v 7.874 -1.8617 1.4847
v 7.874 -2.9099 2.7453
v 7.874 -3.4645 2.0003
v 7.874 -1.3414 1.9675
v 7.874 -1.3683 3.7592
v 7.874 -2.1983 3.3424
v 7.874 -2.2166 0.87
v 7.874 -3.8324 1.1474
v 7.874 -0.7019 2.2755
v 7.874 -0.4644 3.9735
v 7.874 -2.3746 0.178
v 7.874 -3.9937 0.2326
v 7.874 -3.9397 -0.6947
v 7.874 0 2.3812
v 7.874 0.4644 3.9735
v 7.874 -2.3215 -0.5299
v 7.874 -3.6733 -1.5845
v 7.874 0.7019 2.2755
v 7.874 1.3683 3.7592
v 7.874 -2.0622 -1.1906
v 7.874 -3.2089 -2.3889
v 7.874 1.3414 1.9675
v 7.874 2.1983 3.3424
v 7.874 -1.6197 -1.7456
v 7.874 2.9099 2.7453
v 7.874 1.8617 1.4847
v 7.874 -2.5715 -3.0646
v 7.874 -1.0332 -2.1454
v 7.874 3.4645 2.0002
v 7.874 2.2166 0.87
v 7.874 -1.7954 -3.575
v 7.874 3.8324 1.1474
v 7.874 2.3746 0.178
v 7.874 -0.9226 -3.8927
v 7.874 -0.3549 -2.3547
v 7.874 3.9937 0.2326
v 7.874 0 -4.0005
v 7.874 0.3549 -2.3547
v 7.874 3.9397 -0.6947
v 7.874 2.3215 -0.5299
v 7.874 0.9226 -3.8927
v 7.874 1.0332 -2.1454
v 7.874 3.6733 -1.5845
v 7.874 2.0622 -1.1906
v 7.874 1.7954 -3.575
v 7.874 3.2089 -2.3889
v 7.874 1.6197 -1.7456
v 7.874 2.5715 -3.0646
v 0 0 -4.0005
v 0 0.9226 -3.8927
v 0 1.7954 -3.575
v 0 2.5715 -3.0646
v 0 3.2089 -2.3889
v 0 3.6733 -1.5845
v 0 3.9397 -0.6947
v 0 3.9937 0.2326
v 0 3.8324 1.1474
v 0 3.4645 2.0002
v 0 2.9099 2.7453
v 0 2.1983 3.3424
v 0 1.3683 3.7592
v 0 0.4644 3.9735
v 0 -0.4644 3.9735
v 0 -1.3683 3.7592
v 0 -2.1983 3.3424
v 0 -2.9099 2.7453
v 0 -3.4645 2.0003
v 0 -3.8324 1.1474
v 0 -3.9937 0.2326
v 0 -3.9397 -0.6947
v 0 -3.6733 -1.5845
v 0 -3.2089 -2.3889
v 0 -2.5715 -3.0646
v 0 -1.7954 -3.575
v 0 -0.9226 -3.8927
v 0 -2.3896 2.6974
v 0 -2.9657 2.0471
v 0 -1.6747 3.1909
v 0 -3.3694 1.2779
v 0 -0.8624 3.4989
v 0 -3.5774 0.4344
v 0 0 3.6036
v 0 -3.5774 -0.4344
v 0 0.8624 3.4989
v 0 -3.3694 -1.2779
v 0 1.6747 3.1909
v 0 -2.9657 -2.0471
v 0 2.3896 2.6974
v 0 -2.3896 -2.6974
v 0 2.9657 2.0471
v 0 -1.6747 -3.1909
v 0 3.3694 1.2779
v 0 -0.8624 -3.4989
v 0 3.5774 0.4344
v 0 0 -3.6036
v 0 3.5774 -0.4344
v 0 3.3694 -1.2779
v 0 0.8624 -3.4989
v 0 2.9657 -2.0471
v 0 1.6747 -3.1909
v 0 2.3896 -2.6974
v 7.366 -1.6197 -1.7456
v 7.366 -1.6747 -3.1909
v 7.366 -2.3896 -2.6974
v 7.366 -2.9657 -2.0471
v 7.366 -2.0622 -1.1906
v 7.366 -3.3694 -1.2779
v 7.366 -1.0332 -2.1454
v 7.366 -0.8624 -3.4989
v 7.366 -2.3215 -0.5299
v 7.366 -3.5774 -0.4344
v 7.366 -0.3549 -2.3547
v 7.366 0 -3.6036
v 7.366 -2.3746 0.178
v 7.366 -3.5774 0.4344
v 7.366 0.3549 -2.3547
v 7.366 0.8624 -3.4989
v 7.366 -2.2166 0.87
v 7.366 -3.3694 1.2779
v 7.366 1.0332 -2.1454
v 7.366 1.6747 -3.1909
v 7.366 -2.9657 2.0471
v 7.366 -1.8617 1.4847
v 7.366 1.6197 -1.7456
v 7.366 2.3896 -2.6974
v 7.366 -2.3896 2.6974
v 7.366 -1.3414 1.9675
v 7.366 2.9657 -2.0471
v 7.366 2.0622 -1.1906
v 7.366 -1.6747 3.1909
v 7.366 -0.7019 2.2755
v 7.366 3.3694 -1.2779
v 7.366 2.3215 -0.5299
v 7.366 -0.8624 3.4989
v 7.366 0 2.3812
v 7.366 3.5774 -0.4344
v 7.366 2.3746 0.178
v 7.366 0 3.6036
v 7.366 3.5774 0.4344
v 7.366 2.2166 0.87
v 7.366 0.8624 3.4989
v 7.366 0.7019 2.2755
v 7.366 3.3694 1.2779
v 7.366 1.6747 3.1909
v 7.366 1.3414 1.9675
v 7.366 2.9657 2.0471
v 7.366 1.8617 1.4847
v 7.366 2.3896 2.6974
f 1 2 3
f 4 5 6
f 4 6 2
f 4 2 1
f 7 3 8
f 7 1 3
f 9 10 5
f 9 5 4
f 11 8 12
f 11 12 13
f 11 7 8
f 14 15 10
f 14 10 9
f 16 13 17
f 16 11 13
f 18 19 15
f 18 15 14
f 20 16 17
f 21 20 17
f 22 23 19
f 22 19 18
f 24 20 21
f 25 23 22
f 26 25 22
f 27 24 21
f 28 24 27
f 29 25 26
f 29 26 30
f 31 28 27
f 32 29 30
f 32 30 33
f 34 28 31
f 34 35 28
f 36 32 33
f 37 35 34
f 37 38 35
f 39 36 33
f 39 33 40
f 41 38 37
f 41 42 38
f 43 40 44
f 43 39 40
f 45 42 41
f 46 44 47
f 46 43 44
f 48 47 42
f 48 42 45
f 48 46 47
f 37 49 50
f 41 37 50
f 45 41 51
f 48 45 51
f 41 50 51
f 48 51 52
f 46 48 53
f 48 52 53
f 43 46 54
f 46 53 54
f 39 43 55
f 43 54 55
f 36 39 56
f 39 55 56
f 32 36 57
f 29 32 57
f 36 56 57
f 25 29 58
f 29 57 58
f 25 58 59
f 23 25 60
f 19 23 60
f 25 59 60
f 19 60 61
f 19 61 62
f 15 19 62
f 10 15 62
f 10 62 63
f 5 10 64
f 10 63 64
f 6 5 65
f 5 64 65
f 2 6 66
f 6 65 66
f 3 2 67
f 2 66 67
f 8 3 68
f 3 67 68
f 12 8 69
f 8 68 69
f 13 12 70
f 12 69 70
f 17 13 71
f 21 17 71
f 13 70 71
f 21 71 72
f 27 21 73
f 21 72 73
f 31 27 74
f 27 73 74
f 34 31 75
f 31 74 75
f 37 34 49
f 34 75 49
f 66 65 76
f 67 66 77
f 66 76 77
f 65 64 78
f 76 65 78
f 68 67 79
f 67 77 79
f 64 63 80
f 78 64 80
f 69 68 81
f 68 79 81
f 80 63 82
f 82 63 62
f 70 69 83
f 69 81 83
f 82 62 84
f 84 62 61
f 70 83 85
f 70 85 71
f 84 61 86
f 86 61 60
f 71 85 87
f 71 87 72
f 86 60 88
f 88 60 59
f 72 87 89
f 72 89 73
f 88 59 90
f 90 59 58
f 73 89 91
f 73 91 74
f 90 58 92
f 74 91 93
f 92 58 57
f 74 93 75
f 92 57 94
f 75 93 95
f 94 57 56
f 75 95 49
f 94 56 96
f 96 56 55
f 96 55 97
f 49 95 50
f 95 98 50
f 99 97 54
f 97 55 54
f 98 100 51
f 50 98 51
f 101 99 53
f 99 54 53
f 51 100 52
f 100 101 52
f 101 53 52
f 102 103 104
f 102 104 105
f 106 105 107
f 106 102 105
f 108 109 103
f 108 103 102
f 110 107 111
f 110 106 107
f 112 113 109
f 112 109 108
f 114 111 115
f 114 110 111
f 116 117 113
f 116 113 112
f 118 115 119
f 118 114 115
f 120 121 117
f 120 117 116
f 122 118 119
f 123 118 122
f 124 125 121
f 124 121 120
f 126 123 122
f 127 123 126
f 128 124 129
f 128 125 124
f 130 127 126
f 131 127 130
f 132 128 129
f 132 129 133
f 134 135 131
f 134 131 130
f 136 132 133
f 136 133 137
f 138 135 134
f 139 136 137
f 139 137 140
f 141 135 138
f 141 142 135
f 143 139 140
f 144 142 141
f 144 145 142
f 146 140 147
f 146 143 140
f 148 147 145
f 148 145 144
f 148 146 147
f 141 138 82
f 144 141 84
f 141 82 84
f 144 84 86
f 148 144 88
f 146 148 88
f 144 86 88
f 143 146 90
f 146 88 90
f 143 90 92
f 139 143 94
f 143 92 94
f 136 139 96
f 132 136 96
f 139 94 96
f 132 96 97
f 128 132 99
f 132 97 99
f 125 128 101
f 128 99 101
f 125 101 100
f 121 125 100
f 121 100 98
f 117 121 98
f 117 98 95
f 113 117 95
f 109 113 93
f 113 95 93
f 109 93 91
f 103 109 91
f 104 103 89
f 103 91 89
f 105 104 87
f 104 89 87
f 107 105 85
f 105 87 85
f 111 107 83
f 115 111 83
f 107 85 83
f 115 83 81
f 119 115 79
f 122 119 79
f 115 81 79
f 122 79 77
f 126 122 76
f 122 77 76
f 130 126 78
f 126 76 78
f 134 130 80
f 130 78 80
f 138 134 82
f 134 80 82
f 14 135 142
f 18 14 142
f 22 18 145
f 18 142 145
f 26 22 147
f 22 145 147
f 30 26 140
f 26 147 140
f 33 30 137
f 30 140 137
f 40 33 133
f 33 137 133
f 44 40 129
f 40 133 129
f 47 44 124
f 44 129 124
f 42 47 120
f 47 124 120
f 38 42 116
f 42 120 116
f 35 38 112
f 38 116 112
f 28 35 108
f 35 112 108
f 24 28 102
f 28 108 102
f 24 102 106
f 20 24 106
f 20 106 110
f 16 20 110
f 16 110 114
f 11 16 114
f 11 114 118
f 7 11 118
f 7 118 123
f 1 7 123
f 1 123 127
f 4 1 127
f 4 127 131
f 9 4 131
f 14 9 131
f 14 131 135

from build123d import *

# Parameters (mm, degrees)
SKETCH1_R          = 4.0005
EXTRUDE1_DEPTH     = 7.874
SKETCH2_R          = 3.603625
CUT_EXTRUDE1_DEPTH = 7.366
SKETCH3_R          = 2.38125
CUT_EXTRUDE2_DEPTH = 1.508


with BuildPart() as part:
    # Sketch1 → Extrude1 (new body)
    with BuildSketch(Plane(origin=(0, 0, 0), x_dir=(0, 0, -1), z_dir=(1, 0, 0))):
        Circle(SKETCH1_R)
    extrude(amount=EXTRUDE1_DEPTH)

    # Sketch2 → Cut-Extrude1 (cut)
    with BuildSketch(Plane.ZY):
        Circle(SKETCH2_R)
    extrude(amount=-CUT_EXTRUDE1_DEPTH, mode=Mode.SUBTRACT)

    # Sketch3 → Cut-Extrude2 (cut, through all)
    with BuildSketch(Plane.ZY.offset(-7.366)):
        Circle(SKETCH3_R)
    extrude(amount=-CUT_EXTRUDE2_DEPTH, mode=Mode.SUBTRACT)


solid = part.part
